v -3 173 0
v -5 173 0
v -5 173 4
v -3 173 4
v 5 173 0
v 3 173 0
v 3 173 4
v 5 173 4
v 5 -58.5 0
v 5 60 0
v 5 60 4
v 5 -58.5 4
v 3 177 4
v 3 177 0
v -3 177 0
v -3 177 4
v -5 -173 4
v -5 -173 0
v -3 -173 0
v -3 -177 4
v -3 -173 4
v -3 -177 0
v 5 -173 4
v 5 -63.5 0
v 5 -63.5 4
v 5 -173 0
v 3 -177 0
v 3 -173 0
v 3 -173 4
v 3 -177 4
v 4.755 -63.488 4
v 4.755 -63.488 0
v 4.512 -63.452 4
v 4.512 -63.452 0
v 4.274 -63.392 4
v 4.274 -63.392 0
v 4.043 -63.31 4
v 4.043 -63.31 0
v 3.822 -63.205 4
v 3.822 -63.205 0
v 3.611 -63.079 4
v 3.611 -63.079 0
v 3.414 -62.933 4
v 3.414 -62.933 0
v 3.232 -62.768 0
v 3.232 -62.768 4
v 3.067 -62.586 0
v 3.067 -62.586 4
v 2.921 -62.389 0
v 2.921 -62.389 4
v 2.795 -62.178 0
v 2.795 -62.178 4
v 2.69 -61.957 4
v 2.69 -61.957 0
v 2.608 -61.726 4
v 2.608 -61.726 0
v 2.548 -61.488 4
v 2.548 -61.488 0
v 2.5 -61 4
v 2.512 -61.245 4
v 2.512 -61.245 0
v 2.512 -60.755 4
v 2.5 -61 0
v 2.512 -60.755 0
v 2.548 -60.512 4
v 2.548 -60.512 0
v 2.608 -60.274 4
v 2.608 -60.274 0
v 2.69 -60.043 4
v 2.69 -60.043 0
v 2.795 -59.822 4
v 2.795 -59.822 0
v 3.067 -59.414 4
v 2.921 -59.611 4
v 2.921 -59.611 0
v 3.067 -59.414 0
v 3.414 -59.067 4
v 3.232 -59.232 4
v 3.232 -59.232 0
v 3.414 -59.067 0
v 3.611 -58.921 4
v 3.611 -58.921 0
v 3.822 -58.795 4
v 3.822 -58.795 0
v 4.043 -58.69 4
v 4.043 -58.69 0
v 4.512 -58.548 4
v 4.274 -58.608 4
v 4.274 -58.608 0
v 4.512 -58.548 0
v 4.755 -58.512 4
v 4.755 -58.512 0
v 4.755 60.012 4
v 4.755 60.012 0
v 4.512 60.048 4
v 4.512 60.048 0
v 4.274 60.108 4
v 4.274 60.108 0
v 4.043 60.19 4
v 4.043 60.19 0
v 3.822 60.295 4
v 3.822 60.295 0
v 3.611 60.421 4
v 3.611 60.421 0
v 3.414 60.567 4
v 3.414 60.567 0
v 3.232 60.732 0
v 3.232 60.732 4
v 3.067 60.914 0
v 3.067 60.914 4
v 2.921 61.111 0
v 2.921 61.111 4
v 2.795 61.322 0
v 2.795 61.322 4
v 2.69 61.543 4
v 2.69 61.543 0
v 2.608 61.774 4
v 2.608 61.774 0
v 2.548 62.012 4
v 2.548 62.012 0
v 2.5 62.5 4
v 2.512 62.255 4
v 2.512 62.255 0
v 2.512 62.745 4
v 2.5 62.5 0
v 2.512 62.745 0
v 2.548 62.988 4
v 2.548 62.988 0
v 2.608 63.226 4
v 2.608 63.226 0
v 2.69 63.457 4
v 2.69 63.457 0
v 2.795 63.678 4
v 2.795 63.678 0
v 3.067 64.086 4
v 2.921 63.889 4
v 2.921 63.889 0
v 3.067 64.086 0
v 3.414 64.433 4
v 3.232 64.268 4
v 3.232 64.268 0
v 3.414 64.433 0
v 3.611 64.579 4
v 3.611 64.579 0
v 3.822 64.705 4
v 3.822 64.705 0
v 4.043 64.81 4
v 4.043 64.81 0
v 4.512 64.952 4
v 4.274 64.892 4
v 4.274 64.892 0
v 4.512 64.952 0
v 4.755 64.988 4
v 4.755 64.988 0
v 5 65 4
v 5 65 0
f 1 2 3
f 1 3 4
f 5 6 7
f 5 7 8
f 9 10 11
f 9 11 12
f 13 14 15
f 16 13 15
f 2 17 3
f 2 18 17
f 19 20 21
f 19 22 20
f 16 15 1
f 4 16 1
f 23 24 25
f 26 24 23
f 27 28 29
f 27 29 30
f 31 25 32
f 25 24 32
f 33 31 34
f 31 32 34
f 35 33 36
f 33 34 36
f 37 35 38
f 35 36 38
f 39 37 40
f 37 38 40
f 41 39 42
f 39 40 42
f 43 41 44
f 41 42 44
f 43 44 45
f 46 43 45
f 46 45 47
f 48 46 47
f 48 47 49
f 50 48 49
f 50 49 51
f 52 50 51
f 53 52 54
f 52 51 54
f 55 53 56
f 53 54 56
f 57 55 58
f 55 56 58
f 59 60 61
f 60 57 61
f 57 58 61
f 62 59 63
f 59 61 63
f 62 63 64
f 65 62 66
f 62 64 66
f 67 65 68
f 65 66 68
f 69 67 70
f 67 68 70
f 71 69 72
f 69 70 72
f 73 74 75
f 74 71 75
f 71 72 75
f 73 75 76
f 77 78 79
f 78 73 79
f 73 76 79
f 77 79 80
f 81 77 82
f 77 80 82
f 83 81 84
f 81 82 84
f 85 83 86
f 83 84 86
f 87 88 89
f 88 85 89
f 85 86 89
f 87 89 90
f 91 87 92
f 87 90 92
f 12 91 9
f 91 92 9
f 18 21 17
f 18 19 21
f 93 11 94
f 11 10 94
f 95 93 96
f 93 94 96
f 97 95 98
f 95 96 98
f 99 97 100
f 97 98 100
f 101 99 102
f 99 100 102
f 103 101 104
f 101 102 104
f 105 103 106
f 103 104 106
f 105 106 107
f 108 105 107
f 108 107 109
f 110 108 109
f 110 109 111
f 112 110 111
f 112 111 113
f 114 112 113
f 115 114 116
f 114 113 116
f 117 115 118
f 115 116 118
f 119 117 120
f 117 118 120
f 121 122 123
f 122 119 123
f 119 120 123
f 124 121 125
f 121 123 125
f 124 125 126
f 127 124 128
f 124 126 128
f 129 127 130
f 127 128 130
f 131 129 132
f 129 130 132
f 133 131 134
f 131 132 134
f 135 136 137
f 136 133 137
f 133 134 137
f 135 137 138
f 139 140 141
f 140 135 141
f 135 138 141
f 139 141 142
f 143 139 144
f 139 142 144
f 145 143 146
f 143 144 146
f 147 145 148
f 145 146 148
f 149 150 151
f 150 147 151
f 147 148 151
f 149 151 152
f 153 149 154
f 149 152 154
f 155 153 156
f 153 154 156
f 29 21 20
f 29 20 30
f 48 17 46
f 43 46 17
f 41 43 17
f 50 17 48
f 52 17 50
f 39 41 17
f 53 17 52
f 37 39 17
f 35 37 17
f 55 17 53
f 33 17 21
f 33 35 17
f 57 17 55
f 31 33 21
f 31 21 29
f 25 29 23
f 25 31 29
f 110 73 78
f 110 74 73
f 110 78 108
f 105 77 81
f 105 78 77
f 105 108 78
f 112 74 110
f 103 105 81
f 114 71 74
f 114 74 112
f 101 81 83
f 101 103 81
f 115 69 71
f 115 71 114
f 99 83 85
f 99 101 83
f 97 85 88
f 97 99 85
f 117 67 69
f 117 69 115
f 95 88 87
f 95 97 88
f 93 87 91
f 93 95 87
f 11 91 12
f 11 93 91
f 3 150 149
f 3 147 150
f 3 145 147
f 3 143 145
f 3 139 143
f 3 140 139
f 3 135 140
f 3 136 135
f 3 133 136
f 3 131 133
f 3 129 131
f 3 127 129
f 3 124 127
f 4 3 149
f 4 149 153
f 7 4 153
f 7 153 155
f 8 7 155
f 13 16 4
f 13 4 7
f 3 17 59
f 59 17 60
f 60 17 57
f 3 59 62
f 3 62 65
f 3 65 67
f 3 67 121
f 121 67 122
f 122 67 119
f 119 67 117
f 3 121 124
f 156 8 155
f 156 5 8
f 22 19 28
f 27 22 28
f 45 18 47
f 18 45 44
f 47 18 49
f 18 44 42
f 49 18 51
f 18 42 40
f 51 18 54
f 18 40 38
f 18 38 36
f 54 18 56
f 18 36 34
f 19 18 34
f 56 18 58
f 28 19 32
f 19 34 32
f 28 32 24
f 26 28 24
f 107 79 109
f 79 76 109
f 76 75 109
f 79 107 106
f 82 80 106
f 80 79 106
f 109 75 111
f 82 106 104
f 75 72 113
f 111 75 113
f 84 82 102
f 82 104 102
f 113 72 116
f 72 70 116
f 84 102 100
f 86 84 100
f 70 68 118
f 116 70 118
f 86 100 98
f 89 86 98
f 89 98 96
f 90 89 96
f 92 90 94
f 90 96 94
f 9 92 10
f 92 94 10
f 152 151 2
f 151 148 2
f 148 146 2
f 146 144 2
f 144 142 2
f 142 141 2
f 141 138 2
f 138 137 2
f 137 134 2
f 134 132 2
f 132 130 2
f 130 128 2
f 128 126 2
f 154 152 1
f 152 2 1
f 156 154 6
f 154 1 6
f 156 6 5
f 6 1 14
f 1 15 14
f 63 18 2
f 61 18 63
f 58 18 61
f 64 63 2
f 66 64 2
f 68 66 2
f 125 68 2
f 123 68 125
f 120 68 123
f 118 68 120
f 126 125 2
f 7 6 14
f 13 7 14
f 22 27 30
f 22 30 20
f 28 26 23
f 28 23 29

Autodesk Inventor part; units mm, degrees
ref_plane "YZ Plane" through (0, 0, 0) normal (1, 0, 0) x (0, 1, 0)
ref_plane "XZ Plane" through (0, 0, 0) normal (0, 1, 0) x (-1, 0, 0)
ref_plane "XY Plane" through (0, 0, 0) normal (0, 0, 1) x (1, 0, 0)
sketch "Sketch1" plane through (0, 0, 0) normal (0, 0, 1) x (1, 0, 0)
  line L0 (-5, 173) -> (-3, 173)
  line L1 (5, 173) -> (5, -173)
  line L2 (5, -173) -> (3, -173)
  line L3 (-5, -173) -> (-5, 173)
  circle A0 centre (5, 62.5) radius 2.5
  circle A1 centre (5, -61) radius 2.5
  line L4 (-3, 173) -> (3, 173) construction
  line L5 (3, 173) -> (3, 177)
  line L6 (3, 177) -> (-3, 177)
  line L7 (-3, 177) -> (-3, 173)
  line L8 (-3, -173) -> (3, -173) construction
  line L9 (3, -173) -> (3, -177)
  line L10 (3, -177) -> (-3, -177)
  line L11 (-3, -177) -> (-3, -173)
  line L12 (0, 173) -> (0, -173)
  line L13 (-3, 173) -> (3, 173) construction
  line L14 (3, 173) -> (5, 173)
  line L15 (-3, -173) -> (-5, -173)
  line L16 (3, -173) -> (-3, -173) construction
  point P0 (0, 0)
  point P1 (0, 0)
  point P2 (5, -63.5)
  point P3 (5, -58.5)
  point P4 (5, 60)
  point P5 (5, 65)
  dimension "d0" = 5
  dimension "d4" = 10
  dimension "d5" = 6
  dimension "d6" = 4
  dimension "d7" = 346
  dimension "d8" = 110.5
  dimension "d9" = 112
extrude "Extrusion1" add sketch "Sketch1" along normal blind 4 contours L0 L7 L6 L5 L14 L1 A0 A1 L2 L9 L10 L11 L15 L3
properties part number "ReedRail_V2" material "Wood (Oak)"
